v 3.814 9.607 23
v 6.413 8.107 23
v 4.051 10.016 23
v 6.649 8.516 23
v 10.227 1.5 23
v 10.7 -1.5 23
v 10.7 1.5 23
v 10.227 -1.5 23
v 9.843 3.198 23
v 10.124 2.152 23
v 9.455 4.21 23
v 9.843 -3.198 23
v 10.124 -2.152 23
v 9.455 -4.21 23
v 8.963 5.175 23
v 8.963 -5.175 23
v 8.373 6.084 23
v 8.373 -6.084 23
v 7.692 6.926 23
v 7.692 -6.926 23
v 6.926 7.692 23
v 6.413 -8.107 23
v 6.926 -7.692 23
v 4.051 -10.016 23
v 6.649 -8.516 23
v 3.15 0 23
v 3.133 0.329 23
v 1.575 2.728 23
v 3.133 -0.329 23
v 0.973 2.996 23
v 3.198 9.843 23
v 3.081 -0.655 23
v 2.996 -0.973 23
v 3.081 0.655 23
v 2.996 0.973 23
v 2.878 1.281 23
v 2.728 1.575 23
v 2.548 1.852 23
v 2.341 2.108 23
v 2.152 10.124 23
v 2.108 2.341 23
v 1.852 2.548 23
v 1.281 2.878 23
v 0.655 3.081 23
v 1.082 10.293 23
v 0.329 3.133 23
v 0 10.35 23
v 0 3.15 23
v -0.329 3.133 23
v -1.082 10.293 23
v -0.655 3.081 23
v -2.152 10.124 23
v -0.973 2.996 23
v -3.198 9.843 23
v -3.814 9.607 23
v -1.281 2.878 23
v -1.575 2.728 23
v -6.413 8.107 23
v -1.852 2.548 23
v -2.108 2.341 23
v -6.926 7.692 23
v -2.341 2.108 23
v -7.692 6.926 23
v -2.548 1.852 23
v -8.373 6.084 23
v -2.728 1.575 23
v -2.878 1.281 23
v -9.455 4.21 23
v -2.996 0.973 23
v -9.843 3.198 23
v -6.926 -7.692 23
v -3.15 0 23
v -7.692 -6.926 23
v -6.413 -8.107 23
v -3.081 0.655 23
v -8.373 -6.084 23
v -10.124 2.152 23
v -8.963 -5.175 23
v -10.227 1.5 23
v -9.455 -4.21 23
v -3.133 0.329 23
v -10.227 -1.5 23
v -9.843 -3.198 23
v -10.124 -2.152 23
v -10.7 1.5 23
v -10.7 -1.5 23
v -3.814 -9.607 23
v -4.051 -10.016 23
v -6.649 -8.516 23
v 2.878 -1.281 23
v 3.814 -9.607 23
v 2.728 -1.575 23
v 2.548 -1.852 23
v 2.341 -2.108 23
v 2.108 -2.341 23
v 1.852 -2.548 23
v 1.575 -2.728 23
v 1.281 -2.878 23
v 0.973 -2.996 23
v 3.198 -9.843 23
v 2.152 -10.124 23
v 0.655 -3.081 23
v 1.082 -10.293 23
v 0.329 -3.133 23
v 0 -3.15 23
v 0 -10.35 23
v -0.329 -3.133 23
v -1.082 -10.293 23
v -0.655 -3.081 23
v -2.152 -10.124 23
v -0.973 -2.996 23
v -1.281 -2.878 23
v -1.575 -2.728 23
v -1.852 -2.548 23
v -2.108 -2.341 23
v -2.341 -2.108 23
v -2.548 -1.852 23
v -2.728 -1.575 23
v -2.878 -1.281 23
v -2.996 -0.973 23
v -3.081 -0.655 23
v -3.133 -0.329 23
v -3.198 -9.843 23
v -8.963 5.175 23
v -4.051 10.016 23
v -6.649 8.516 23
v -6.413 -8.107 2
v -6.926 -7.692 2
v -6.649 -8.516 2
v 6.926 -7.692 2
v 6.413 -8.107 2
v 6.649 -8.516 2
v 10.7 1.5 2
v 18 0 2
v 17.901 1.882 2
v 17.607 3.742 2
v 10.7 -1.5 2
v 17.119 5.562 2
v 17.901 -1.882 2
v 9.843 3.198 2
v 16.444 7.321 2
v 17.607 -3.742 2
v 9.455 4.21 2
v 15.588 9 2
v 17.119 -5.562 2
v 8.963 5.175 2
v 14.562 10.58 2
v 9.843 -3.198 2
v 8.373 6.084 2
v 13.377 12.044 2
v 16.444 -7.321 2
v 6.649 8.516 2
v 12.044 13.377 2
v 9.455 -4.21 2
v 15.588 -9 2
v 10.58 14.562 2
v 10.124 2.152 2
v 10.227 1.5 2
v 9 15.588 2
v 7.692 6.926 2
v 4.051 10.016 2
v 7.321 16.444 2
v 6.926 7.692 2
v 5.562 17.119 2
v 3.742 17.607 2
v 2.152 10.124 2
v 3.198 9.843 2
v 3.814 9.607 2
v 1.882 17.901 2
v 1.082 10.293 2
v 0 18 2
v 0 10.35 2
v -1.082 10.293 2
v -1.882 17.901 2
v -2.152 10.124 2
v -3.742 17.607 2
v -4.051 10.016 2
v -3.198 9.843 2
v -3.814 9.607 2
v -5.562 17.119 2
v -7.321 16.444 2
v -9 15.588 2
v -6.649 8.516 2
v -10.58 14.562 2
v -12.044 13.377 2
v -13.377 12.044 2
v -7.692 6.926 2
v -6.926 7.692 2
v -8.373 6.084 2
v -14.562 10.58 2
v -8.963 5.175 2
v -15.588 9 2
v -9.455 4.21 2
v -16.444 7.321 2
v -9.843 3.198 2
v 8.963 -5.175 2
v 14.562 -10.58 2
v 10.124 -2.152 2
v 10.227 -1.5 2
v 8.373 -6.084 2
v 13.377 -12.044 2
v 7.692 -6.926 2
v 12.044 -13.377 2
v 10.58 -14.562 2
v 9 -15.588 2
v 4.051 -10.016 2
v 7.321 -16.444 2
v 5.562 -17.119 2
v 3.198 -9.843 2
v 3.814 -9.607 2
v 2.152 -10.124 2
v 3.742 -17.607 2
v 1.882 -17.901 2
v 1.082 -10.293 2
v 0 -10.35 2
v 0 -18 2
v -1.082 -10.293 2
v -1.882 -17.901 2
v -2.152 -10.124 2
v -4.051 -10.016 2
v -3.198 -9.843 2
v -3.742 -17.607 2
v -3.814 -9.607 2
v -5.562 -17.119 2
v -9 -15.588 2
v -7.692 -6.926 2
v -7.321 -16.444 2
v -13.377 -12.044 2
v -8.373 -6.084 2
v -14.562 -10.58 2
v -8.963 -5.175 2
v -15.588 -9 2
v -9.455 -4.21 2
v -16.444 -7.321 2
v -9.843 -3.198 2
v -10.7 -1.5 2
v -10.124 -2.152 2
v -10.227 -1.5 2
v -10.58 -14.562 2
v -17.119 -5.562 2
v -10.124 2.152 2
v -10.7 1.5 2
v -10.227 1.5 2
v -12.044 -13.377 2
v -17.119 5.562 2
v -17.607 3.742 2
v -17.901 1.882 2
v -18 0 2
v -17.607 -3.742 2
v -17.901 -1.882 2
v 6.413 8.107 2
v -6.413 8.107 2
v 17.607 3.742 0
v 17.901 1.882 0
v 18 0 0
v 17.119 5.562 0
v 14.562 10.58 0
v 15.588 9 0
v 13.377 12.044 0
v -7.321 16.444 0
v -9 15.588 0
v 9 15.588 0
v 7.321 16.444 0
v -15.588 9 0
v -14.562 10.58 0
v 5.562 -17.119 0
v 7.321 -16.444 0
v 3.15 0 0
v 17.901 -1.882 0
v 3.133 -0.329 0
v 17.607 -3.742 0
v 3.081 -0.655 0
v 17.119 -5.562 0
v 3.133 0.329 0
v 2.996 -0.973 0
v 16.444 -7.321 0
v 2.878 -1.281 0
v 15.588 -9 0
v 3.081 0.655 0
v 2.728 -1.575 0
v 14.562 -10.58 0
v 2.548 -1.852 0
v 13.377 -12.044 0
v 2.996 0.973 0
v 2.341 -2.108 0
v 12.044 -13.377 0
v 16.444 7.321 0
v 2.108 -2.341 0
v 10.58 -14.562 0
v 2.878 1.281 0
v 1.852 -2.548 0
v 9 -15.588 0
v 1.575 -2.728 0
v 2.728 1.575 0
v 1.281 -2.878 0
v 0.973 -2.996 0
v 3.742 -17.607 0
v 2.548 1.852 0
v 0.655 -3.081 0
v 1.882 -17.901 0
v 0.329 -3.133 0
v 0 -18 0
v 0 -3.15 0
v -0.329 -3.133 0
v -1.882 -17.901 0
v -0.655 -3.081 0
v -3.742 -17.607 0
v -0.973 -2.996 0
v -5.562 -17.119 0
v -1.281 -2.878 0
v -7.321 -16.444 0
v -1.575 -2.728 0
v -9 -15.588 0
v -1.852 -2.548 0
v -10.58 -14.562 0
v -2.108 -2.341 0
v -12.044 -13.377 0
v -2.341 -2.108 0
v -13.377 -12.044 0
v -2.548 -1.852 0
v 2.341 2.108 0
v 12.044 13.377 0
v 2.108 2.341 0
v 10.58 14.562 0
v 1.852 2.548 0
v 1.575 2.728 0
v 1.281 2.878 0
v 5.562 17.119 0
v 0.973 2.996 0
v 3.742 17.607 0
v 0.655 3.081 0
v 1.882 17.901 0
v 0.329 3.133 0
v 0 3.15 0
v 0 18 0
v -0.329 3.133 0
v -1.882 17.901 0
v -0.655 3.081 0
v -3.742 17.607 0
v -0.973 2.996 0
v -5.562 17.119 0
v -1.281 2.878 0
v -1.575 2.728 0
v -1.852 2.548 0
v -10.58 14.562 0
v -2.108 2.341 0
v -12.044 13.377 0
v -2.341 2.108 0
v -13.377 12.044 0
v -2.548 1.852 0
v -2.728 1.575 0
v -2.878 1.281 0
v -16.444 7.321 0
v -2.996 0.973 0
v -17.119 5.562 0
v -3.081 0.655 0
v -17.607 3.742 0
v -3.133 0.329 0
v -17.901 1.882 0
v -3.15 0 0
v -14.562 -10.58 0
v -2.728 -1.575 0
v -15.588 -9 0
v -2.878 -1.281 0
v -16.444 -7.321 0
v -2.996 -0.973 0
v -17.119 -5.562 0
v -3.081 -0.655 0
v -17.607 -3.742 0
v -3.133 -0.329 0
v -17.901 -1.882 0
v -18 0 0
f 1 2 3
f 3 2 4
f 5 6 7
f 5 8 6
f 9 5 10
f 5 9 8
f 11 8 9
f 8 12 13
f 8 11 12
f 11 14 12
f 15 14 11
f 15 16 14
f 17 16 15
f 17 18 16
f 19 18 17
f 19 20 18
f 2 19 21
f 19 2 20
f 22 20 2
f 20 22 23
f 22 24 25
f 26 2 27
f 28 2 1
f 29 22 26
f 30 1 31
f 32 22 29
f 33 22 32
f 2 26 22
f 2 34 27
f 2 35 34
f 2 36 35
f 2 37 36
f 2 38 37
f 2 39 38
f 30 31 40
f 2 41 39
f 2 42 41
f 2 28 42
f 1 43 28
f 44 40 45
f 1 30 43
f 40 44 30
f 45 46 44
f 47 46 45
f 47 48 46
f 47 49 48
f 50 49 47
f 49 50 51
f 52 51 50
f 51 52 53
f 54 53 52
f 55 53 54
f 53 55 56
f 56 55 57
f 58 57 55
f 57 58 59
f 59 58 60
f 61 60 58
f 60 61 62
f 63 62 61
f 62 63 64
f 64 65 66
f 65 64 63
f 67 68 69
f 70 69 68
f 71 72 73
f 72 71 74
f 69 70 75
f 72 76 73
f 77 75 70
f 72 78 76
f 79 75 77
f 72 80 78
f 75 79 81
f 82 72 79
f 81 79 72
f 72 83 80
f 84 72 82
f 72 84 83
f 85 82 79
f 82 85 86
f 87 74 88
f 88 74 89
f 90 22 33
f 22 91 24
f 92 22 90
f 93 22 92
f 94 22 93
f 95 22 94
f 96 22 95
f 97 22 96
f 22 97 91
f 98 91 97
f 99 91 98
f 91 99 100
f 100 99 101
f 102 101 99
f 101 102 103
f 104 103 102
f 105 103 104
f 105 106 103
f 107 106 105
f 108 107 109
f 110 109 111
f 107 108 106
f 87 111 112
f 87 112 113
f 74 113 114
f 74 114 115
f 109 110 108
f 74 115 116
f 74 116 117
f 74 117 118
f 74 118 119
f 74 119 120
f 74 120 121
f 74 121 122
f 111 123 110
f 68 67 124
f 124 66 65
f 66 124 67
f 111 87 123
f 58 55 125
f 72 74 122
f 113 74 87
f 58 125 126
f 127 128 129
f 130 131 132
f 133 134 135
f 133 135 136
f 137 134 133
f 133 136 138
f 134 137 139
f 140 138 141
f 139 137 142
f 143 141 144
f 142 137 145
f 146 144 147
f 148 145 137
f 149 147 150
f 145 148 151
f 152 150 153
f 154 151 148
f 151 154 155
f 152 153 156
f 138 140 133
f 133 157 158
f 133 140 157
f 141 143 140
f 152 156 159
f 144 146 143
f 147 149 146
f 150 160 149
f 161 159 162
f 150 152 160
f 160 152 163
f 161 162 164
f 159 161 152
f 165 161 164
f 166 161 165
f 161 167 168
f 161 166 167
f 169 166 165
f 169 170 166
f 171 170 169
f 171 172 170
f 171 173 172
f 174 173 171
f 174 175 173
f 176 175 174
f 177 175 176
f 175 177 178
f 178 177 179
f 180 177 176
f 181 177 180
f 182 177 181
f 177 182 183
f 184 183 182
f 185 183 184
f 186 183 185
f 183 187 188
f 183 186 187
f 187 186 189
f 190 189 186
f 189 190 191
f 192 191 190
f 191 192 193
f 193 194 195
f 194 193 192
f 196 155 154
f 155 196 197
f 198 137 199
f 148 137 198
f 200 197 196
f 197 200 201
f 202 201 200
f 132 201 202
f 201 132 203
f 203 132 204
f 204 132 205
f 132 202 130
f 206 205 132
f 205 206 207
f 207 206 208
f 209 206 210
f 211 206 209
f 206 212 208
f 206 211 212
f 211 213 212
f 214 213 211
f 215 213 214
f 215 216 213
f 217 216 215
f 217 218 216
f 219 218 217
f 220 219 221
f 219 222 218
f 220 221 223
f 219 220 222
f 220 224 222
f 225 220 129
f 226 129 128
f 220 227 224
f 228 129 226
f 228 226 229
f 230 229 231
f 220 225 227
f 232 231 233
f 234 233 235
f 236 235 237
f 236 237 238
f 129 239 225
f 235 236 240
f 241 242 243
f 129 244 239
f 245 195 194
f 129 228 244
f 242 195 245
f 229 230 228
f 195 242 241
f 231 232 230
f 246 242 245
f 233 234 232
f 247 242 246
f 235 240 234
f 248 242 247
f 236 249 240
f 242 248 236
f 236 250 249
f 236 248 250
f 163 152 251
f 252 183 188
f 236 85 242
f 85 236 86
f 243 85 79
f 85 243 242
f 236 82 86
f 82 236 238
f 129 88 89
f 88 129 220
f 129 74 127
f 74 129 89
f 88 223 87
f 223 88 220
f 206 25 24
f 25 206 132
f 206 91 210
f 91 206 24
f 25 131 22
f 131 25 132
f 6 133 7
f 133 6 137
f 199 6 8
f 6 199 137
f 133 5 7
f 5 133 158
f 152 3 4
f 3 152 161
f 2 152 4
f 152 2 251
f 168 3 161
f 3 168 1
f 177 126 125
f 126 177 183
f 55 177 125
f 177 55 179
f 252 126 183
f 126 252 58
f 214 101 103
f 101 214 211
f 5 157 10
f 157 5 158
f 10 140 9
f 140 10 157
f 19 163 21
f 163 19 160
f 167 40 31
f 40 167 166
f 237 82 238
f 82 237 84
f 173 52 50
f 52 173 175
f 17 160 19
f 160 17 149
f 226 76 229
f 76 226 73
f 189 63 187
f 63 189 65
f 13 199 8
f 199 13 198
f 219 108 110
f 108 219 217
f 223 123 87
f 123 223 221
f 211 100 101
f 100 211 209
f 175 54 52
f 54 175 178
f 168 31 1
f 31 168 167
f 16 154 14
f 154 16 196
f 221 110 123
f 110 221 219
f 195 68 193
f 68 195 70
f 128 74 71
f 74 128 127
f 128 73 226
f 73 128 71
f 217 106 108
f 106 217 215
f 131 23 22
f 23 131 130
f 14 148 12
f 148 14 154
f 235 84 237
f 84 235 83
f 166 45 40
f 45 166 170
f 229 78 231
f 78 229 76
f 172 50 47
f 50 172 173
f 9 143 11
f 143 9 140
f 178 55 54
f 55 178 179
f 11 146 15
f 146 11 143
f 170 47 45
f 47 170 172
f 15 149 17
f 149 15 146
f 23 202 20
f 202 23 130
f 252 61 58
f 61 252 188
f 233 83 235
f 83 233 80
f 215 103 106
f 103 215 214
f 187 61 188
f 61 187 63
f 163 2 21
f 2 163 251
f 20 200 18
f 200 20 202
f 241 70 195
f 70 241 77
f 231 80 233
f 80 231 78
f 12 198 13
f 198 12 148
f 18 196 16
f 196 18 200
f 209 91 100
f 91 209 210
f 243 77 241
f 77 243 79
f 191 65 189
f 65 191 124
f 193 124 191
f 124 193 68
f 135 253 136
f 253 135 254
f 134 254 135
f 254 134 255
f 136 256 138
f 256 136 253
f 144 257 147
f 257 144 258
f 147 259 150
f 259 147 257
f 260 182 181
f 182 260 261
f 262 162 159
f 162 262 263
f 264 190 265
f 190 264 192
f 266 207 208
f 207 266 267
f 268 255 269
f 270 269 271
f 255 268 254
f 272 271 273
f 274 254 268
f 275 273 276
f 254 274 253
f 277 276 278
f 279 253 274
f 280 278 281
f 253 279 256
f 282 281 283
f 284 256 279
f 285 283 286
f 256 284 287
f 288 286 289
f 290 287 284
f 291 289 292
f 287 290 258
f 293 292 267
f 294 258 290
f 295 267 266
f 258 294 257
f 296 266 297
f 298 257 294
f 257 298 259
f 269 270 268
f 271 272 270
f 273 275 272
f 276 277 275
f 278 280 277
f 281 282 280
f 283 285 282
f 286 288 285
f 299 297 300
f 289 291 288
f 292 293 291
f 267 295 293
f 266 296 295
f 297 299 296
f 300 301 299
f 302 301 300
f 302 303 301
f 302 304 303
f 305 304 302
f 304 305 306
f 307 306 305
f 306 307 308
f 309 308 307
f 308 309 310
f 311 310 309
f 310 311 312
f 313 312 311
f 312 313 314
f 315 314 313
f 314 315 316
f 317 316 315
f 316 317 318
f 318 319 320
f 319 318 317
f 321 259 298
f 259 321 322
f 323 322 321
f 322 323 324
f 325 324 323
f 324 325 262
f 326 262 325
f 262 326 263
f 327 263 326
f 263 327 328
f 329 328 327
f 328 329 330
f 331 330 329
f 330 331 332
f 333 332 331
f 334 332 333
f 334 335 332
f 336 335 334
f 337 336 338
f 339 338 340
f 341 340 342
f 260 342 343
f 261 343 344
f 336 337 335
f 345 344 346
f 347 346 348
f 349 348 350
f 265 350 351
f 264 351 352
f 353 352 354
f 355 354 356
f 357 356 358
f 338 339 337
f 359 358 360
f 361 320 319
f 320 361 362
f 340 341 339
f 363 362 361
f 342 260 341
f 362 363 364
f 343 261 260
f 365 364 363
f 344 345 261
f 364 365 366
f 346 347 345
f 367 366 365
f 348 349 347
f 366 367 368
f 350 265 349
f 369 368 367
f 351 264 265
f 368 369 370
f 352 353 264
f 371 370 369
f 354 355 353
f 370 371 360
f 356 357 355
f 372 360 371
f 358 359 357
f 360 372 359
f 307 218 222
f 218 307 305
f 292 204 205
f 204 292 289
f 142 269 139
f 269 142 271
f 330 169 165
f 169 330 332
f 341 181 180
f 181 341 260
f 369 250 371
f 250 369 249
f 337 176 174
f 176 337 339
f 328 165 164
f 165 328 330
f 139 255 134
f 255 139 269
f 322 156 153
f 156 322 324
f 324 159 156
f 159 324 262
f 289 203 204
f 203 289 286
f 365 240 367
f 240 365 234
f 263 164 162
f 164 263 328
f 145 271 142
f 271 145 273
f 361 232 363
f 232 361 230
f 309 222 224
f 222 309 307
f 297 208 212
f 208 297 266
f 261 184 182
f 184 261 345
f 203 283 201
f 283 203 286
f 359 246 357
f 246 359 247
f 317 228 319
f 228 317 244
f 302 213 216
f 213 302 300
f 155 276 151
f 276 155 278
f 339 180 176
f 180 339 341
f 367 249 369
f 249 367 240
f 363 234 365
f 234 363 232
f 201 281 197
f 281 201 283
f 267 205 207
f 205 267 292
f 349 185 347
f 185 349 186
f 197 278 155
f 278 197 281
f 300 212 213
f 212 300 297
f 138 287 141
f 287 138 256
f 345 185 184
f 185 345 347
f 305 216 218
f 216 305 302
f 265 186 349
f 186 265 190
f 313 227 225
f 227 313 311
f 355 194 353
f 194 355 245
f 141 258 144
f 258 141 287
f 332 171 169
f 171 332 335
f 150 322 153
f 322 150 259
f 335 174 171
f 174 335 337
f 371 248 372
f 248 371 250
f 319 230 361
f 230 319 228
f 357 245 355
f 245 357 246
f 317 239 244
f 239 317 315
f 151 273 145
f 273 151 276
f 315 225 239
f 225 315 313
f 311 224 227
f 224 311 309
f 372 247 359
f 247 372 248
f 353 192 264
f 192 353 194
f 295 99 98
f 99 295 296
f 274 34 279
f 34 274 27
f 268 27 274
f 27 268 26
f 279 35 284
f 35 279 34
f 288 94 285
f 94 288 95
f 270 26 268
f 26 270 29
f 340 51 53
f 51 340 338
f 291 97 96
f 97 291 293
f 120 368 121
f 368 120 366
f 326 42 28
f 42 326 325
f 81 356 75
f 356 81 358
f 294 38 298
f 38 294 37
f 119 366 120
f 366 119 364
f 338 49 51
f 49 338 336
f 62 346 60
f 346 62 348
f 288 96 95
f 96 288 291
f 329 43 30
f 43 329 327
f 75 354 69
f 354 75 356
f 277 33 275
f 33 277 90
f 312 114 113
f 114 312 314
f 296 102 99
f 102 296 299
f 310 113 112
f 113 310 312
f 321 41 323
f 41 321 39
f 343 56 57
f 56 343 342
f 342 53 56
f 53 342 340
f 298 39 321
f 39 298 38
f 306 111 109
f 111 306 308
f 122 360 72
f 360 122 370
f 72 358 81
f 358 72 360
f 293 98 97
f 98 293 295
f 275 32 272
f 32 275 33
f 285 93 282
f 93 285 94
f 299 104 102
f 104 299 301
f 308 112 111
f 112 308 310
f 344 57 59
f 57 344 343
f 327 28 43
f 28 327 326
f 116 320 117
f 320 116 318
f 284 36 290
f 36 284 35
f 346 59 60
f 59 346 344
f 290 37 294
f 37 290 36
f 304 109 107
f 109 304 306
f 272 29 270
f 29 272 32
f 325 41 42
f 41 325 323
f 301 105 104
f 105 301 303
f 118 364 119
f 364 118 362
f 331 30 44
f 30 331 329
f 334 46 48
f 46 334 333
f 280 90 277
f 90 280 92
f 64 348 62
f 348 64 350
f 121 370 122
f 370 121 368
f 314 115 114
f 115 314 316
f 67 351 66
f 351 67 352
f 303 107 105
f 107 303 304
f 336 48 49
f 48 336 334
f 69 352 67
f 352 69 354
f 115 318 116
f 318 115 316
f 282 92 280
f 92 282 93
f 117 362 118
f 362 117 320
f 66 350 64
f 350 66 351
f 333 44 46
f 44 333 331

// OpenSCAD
// A Base for Solar Lights.
// By Ari M. Diacou
// http://www.thingiverse.com/thing:78398
// A 6"x1/4" landscaping nail gets hammered through the middle, and the light slides on top
// Default values are for a stand tube with an internal diameter of 7/8" for a set of Solar Lights sold by Costco


//Diameter of the male part
D=21;	
	
//Height of the male part, most pieces are around D=H 
H=21; 		

//Height of the base in mm
H2 = 2; 			

//Diameter of the base in mm
D2 = 36; 			

//How much the ribs/male part come past the given diameter D
tolerance = 0.2;	

//How far the ribs come out from the first diameter
delta=0.5;		

//Bore diameter 1/4"=6.35 mm for landscaping stake
B=6.3; 			

Resolution = 60; //internal variable for resolution of rendering
$fn=Resolution; 

number_of_ribs = 6;

rib_thickness = 3;

difference(){ 	//remove the bore from...
	union() {		//add the male part, base and ribs
		translate([0,0,H2]) cylinder(h=H, r=(D+tolerance-delta)/2);		//male part
		cylinder(h=H2, r=D2/2);													//base
		ribs(number_of_ribs);														//ribs, defined below
		}
	cylinder(h=H+H2, r=B/2); 													//the bore
	}

module ribs(n){ //creates n ribs spaced axially around the bore, extending tolerance beyond D/2
	R=D/2+tolerance;
	thickness = rib_thickness;
	if (n > 0){	//if you dont put this in, and call ribs(0), shit crashes
		for ( i = [0 : 5] ){
    			rotate( i * 360 / n, [0, 0, 1])
    			translate([-R, -thickness/2, H2]) 
			cube([R, thickness, H]);
			}
	}
}




			
